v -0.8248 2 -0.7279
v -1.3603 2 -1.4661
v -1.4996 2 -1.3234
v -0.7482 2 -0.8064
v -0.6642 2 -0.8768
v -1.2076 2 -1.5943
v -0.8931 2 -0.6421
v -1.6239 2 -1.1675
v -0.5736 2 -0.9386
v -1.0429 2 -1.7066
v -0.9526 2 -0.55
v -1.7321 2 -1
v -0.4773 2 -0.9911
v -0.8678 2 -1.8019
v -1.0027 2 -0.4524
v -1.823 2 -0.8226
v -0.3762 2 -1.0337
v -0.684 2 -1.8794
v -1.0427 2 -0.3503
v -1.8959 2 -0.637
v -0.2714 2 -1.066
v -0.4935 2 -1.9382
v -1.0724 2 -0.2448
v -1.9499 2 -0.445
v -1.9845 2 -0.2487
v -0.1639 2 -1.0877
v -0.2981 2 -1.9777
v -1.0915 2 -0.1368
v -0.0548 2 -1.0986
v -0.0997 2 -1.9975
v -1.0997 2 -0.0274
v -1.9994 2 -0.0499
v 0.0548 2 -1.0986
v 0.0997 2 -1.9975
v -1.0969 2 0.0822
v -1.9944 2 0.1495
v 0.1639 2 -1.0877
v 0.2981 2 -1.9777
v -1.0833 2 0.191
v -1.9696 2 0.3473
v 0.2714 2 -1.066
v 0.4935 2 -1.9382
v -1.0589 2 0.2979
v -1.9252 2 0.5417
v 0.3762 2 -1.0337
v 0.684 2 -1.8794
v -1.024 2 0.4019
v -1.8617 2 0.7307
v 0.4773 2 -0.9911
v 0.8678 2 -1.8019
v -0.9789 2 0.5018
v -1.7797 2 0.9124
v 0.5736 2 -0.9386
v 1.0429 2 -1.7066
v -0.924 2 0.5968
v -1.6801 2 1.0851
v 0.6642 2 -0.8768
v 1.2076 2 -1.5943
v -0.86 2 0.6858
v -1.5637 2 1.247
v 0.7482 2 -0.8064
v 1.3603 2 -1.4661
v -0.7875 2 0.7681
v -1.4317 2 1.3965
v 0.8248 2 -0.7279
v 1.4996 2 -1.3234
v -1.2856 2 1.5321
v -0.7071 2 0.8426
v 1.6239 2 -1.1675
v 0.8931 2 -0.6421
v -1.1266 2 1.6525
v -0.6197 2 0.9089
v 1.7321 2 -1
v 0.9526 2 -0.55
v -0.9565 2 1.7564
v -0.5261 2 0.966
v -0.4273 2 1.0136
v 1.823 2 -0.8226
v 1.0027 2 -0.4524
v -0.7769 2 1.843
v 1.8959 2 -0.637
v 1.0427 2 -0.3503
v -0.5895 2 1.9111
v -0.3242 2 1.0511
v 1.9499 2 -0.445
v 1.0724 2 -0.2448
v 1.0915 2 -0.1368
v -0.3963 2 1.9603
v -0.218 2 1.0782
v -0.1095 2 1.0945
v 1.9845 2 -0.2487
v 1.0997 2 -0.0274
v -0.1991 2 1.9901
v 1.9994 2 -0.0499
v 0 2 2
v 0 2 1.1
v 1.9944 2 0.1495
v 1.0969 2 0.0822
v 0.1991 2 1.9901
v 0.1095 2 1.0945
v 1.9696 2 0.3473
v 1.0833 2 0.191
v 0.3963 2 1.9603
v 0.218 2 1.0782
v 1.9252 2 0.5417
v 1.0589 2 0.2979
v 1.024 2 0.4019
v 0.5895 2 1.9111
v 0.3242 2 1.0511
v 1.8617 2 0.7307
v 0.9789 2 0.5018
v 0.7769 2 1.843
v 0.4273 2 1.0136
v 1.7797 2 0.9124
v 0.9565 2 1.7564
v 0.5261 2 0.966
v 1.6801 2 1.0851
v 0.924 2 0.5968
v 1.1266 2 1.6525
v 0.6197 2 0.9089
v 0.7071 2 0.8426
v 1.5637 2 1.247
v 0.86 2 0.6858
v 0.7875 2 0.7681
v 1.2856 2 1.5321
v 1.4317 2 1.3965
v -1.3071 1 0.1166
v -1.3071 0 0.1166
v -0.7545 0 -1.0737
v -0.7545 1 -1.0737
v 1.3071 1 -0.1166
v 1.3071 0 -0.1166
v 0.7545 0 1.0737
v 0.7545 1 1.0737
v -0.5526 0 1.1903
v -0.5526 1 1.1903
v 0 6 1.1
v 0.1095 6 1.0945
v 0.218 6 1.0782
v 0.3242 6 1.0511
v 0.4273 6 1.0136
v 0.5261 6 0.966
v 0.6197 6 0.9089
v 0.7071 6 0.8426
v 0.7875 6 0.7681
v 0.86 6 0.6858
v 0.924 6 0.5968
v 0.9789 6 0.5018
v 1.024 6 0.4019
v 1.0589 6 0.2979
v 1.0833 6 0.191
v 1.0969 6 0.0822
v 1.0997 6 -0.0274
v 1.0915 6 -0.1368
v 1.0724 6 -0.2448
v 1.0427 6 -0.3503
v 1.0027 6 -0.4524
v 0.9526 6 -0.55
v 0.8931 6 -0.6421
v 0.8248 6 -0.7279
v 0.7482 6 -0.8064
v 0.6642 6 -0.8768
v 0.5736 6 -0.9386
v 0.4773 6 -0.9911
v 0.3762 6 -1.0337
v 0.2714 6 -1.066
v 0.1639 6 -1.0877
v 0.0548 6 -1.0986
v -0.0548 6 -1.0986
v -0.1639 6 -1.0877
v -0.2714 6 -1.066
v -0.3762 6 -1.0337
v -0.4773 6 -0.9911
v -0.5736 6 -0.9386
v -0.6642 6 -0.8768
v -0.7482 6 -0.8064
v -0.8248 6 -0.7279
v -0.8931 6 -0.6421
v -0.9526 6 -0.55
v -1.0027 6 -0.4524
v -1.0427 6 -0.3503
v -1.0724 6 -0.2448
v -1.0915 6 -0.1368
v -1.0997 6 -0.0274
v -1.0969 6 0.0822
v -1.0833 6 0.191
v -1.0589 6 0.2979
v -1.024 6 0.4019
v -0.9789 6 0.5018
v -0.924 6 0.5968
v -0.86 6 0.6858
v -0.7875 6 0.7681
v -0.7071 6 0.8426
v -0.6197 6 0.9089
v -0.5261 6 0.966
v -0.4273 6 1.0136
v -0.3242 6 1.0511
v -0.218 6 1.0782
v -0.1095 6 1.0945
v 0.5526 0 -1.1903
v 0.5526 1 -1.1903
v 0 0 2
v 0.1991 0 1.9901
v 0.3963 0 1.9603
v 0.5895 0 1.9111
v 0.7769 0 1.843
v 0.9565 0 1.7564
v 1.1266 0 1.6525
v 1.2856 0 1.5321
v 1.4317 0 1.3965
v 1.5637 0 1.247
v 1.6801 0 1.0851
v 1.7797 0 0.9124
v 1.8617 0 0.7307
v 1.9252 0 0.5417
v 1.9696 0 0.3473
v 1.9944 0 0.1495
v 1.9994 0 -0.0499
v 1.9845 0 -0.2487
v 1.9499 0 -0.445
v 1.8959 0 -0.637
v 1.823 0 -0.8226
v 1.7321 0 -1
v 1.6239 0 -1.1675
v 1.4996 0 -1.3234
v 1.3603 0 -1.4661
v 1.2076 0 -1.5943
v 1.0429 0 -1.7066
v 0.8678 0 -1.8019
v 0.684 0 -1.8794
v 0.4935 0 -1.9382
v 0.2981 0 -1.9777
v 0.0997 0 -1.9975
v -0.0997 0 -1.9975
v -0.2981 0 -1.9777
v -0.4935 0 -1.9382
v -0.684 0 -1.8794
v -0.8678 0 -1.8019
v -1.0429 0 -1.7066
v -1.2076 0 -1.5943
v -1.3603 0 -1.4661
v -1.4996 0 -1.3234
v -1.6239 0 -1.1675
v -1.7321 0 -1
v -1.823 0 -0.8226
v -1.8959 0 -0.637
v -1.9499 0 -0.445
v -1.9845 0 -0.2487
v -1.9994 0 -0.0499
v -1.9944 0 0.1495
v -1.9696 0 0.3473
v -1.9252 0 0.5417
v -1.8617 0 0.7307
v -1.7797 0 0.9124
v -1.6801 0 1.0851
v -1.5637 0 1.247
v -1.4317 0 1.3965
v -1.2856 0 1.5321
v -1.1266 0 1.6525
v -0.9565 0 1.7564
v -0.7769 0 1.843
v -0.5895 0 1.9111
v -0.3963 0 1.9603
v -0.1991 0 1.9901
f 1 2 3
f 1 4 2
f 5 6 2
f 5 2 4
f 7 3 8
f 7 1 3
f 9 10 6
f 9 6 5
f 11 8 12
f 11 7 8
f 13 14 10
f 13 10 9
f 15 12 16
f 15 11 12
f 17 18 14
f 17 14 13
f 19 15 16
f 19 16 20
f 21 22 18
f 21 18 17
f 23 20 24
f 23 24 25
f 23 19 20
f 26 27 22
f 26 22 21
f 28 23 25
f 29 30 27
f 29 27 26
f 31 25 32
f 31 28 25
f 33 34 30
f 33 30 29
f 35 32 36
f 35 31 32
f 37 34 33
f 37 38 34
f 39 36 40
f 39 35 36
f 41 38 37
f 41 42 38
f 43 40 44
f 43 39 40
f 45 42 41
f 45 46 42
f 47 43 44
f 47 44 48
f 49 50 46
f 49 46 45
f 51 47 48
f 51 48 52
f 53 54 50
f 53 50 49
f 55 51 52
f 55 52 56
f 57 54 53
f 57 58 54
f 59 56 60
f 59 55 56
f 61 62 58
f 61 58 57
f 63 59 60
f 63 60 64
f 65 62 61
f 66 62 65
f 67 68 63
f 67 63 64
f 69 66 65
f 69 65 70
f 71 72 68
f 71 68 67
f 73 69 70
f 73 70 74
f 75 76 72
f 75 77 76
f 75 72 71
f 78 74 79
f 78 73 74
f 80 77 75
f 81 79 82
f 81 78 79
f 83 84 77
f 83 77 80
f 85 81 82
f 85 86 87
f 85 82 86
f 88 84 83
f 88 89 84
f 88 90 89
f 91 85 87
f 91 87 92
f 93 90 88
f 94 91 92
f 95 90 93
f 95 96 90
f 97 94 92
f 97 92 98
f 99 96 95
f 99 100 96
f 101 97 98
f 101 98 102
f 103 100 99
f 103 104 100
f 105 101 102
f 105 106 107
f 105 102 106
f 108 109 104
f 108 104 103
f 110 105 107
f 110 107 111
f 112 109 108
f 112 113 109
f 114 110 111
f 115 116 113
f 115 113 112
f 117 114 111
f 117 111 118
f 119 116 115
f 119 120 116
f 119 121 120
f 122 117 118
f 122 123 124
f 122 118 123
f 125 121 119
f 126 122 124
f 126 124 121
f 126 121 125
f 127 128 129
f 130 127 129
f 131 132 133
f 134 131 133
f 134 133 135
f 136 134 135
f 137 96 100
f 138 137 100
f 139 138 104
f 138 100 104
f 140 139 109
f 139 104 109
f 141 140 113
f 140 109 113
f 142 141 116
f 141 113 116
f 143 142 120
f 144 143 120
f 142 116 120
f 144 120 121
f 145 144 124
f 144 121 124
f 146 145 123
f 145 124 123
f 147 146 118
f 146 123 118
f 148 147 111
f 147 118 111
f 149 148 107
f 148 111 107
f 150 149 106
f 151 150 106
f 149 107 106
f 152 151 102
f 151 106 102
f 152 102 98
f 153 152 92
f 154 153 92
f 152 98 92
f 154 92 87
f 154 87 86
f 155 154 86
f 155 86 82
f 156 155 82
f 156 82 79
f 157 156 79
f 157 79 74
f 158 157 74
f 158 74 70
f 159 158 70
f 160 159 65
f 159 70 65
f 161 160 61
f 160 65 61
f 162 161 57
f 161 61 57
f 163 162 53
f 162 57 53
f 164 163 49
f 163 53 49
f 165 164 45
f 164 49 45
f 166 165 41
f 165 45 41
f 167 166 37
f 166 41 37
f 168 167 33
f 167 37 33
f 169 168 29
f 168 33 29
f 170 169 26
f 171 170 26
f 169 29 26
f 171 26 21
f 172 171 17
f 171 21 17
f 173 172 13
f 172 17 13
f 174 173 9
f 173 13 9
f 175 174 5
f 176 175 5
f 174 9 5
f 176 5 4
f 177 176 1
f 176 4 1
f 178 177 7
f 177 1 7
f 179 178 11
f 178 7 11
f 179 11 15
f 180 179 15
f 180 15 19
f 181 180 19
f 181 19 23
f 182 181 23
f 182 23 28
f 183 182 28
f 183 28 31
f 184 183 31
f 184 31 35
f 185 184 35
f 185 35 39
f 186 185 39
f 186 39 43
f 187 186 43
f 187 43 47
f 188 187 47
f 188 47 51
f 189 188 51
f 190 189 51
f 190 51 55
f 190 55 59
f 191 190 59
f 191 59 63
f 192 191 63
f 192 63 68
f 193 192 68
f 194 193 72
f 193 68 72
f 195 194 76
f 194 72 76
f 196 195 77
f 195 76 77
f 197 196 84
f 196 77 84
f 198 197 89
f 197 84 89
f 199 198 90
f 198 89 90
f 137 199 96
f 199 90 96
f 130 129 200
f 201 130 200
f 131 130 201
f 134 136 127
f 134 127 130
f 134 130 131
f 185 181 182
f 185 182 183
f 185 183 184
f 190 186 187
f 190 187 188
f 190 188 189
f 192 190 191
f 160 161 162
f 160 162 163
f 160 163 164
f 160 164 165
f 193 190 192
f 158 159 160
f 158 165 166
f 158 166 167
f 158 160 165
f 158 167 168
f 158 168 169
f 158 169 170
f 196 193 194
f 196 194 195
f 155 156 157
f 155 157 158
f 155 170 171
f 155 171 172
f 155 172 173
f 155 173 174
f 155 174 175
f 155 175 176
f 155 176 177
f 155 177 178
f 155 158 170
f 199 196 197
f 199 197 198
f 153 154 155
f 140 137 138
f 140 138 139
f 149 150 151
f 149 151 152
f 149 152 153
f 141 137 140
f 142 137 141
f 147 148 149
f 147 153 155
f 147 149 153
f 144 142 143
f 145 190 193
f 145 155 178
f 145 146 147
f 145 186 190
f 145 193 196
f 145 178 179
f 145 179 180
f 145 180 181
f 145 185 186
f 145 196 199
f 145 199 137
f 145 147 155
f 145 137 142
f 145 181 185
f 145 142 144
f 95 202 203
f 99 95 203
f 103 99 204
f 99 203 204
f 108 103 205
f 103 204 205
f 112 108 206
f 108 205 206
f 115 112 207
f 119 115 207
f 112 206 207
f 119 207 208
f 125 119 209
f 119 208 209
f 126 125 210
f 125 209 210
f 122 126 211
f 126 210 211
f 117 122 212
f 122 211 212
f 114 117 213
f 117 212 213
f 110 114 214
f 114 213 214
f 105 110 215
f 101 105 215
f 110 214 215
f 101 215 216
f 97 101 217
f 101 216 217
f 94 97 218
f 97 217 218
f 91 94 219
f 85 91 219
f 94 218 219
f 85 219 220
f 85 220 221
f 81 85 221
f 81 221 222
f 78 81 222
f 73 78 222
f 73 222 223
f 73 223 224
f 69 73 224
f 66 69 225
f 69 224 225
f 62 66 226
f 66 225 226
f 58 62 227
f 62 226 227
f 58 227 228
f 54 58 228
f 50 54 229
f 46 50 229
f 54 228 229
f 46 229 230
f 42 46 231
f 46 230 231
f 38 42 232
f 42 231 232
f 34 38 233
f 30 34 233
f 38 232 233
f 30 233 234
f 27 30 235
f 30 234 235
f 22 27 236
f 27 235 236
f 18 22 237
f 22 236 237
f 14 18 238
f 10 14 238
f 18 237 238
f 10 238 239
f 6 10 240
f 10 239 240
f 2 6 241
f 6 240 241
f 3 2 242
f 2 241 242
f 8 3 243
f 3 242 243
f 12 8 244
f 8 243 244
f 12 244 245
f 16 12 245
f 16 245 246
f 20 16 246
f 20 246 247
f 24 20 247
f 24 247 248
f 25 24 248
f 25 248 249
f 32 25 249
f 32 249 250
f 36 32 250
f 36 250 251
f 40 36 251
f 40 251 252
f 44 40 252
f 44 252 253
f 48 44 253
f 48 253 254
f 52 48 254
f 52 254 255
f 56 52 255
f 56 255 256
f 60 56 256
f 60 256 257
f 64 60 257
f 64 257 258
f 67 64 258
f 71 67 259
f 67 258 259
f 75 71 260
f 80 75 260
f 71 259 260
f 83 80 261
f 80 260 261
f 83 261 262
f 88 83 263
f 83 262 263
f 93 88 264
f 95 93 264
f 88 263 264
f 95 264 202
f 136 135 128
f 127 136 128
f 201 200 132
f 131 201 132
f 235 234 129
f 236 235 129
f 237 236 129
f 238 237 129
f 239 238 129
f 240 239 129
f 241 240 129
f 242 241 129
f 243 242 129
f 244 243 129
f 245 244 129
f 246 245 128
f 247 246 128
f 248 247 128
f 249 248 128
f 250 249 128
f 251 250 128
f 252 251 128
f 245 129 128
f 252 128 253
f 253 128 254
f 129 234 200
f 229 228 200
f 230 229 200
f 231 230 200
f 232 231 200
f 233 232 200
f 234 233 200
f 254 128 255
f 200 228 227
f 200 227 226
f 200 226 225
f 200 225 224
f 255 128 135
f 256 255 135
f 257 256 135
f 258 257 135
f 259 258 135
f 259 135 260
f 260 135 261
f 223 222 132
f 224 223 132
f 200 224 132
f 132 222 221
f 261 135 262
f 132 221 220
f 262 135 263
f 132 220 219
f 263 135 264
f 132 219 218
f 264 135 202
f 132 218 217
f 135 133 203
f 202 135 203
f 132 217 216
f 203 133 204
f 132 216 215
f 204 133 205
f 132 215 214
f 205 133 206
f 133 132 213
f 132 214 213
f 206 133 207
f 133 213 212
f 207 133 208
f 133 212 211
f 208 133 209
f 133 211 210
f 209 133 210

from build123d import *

# Parameters (mm, degrees)
SKETCH1_R           = 2
BOSS_EXTRUDE1_DEPTH = 2
CUT_EXTRUDE1_DEPTH  = 1
SKETCH3_R           = 1.1
BOSS_EXTRUDE2_DEPTH = 4


with BuildPart() as part:
    # Sketch1 → Boss-Extrude1 (new body)
    with BuildSketch(Plane(origin=(0, 0, 0), x_dir=(1, 0, 0), z_dir=(0, 1, 0))):
        with Locations(Location((0, 0, 0), (0, 0, 270))):
            Circle(SKETCH1_R)
    extrude(amount=BOSS_EXTRUDE1_DEPTH)

    # Sketch2 → Cut-Extrude1 (cut)
    with BuildSketch(Plane.XZ):
        Polygon((1.30710226, -0.116595976), (0.754526207, 1.073685774), (-0.552576053, 1.190281751), (-1.30710226, 0.116595976), (-0.754526207, -1.073685774), (0.552576053, -1.190281751), align=None)
    extrude(amount=-CUT_EXTRUDE1_DEPTH, mode=Mode.SUBTRACT)

    # Sketch3 → Boss-Extrude2 (add)
    with BuildSketch(Plane(origin=(0, 2, 0), x_dir=(1, 0, 0), z_dir=(0, 1, 0))):
        with Locations(Location((0, 0, 0), (0, 0, 270))):
            Circle(SKETCH3_R)
    extrude(amount=BOSS_EXTRUDE2_DEPTH)


solid = part.part
